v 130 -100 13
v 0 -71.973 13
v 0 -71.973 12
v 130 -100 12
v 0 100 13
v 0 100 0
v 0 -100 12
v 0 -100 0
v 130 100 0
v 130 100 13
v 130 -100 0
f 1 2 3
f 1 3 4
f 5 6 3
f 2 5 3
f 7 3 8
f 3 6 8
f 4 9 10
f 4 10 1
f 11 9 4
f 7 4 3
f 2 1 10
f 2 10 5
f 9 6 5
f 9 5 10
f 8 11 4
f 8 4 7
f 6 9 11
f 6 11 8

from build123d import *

# Parameters (mm, degrees)
PAD_DEPTH    = 13
POCKET_DEPTH = 1


with BuildPart() as part:
    # Sketch → Pad (new body)
    with BuildSketch(Plane.XY):
        Polygon((0, 0), (0, 100), (130, 100), (130, -100), (0, -100), align=None)
    extrude(amount=PAD_DEPTH)

    # Sketch002 (on Face7 of Pad) → Pocket (cut)
    with BuildSketch(Plane.XY.offset(13)):
        Polygon((0, -100), (0, -71.973152), (130, -100), align=None)
    extrude(amount=-POCKET_DEPTH, mode=Mode.SUBTRACT)


solid = part.part
